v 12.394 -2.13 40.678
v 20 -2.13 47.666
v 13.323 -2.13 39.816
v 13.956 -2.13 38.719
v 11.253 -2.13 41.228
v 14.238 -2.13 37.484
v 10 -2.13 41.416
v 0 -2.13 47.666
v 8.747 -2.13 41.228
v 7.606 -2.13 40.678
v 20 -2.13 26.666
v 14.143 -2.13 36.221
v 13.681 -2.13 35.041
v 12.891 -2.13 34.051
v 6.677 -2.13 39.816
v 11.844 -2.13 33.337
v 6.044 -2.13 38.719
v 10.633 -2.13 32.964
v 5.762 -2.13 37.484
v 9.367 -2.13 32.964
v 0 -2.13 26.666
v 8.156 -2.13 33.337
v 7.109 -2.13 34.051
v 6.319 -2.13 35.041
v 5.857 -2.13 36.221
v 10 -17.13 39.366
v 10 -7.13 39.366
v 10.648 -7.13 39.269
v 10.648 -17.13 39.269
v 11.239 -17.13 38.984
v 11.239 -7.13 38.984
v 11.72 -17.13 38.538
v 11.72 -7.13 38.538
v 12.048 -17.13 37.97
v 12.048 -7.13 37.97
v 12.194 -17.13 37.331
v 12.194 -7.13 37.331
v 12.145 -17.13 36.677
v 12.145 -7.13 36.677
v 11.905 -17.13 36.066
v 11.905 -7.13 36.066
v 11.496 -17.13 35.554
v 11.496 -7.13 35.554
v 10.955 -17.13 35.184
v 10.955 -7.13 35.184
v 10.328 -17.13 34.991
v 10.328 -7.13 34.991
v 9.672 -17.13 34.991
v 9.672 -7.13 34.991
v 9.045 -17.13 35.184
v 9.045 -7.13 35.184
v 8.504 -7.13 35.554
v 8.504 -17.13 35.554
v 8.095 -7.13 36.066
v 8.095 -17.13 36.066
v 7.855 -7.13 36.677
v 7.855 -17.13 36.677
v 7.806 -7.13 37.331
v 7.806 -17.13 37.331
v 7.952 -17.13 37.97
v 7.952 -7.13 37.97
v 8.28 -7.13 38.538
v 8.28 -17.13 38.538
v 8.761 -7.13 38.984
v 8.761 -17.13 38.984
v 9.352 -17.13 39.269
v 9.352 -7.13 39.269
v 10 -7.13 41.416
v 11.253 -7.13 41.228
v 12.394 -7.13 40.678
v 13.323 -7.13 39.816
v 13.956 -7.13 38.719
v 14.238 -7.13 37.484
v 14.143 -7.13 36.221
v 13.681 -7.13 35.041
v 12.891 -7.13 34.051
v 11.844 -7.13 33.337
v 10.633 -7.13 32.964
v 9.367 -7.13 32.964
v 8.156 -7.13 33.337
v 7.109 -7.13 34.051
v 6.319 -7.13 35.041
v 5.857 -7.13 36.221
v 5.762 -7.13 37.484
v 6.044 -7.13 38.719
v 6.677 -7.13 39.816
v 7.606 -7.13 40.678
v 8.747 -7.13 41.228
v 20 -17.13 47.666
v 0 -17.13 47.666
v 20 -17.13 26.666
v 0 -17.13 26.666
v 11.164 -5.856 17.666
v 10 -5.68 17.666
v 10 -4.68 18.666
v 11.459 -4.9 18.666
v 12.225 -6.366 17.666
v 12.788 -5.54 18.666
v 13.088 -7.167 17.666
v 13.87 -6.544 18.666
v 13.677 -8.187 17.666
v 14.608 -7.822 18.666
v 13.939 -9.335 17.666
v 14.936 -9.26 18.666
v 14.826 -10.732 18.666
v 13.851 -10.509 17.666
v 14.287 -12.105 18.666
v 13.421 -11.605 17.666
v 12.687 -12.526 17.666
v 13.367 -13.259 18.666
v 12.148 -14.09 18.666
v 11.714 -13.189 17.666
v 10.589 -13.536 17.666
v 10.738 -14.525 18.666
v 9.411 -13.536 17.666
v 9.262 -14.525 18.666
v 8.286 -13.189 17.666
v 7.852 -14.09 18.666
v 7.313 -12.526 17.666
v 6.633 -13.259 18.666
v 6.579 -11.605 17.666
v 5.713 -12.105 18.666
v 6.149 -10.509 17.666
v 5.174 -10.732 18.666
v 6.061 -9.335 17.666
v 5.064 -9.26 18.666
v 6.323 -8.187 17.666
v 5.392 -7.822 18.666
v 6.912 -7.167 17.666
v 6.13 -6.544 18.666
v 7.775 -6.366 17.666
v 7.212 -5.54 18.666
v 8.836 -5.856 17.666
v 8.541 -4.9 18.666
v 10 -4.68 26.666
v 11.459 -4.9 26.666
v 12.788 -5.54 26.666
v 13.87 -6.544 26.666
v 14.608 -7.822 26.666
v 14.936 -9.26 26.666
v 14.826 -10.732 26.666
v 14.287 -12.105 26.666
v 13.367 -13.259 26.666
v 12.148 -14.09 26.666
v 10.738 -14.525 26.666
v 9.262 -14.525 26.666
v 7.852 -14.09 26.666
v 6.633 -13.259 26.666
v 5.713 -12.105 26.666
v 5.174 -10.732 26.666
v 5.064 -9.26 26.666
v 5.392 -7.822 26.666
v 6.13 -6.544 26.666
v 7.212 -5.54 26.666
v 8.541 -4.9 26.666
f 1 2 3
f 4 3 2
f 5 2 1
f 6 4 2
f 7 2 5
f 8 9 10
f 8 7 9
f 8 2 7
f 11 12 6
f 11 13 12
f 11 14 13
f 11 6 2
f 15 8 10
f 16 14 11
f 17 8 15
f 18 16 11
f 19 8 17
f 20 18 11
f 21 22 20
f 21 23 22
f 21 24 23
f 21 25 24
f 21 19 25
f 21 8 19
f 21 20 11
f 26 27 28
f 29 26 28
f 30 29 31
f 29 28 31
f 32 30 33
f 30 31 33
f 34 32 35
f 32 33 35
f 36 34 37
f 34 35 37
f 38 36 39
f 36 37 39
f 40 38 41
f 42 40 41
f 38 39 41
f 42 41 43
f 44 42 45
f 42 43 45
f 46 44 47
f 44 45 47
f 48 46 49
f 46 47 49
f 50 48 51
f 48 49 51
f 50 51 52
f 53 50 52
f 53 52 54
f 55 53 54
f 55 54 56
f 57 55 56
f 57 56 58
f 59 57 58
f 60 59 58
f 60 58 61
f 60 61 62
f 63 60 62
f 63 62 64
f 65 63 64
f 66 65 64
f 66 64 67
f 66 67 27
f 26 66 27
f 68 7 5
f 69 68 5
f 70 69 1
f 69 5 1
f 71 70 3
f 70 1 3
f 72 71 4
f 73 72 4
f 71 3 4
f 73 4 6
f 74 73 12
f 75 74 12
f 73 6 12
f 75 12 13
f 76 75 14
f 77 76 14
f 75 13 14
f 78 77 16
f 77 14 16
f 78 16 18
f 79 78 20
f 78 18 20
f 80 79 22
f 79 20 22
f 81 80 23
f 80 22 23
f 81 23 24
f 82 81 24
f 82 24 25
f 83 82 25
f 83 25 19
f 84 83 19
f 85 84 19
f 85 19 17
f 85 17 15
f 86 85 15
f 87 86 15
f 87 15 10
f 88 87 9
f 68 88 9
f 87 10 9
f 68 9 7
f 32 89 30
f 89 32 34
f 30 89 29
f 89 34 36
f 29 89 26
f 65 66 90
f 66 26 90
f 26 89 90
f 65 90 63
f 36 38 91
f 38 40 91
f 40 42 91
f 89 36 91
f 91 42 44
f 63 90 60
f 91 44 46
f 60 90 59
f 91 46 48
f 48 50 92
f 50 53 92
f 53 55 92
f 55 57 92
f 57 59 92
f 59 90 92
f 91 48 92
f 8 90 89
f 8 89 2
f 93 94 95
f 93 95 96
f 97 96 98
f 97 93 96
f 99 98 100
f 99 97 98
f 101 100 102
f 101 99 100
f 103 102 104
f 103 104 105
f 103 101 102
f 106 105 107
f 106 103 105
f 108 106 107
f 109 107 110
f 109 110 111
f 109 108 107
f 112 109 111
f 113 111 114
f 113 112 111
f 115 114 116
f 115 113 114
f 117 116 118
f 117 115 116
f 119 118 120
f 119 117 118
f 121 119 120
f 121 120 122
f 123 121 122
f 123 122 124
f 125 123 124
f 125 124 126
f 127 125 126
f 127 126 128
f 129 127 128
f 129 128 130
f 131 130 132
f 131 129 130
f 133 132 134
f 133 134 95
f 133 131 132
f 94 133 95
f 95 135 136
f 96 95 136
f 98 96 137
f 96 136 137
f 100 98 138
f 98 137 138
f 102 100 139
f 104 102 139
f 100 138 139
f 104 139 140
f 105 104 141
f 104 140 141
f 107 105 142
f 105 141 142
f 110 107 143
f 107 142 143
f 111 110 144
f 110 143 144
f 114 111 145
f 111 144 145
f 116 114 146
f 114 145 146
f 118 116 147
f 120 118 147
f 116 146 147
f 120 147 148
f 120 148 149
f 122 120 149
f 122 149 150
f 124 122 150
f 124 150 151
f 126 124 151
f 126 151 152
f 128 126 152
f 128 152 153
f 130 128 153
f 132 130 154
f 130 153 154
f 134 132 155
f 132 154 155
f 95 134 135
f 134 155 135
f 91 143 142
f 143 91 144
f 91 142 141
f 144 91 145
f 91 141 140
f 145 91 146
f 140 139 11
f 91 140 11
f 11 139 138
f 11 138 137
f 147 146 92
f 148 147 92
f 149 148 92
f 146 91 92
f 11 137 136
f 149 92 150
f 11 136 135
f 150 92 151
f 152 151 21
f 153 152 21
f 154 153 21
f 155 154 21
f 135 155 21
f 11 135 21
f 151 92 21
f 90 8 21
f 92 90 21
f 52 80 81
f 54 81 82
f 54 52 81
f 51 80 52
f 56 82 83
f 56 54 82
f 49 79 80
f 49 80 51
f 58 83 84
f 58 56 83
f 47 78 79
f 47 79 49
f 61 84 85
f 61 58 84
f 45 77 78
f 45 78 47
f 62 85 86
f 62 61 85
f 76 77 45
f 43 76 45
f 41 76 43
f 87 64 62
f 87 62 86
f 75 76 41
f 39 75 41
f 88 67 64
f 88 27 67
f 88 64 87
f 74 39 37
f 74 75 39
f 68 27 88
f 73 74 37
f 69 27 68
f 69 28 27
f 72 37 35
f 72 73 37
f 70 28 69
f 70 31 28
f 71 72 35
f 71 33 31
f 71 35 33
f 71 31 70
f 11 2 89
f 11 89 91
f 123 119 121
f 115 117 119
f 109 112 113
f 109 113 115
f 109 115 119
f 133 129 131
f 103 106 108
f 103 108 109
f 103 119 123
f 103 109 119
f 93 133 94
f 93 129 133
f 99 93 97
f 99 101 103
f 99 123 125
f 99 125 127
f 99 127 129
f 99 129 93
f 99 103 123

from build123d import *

# Parameters (mm, degrees)
SKETCH1_W           = 21
SKETCH1_H           = 15
BOSS_EXTRUDE1_DEPTH = 20
SKETCH2_R           = 4.95
BOSS_EXTRUDE2_DEPTH = 9
CHAMFER1_SIZE       = 1
SKETCH3_R           = 2.2
CUT_EXTRUDE1_DEPTH  = 54.824529308
SKETCH4_R           = 4.25
CUT_EXTRUDE2_DEPTH  = 5


with BuildPart() as part:
    # Sketch1 → Boss-Extrude1 (new body)
    with BuildSketch(Plane(origin=(0, 0, 0), x_dir=(0, 0, -1), z_dir=(1, 0, 0))):
        with Locations((-37.166339855, -9.630048879)):
            Rectangle(SKETCH1_W, SKETCH1_H)
    extrude(amount=BOSS_EXTRUDE1_DEPTH)

    # Sketch2 → Boss-Extrude2 (add)
    with BuildSketch(Plane(origin=(0, 0, 26.666339855), x_dir=(-1, 0, 0), z_dir=(0, 0, -1))):
        with Locations(Location((-10, -9.630048879, 0), (0, 0, 90))):
            Circle(SKETCH2_R)
    extrude(amount=BOSS_EXTRUDE2_DEPTH)

    # Chamfer1
    chamfer1_edges = [part.edges().sort_by_distance(p)[0] for p in [
        (10, -14.580048879, 17.666339855),
    ]]
    chamfer(chamfer1_edges, length=CHAMFER1_SIZE)

    # Sketch3 → Cut-Extrude1 (cut, through all)
    with BuildSketch(Plane(origin=(0, -2.130048879, 0), x_dir=(1, 0, 0), z_dir=(0, 1, 0))):
        with Locations(Location((10, -37.166339855, 0), (0, 0, 270))):
            Circle(SKETCH3_R)
    extrude(amount=-CUT_EXTRUDE1_DEPTH, mode=Mode.SUBTRACT)

    # Sketch4 → Cut-Extrude2 (cut)
    with BuildSketch(Plane(origin=(0, -2.130048879, 0), x_dir=(1, 0, 0), z_dir=(0, 1, 0))):
        with Locations(Location((10, -37.166339855, 0), (0, 0, 270))):
            Circle(SKETCH4_R)
    extrude(amount=-CUT_EXTRUDE2_DEPTH, mode=Mode.SUBTRACT)


solid = part.part
